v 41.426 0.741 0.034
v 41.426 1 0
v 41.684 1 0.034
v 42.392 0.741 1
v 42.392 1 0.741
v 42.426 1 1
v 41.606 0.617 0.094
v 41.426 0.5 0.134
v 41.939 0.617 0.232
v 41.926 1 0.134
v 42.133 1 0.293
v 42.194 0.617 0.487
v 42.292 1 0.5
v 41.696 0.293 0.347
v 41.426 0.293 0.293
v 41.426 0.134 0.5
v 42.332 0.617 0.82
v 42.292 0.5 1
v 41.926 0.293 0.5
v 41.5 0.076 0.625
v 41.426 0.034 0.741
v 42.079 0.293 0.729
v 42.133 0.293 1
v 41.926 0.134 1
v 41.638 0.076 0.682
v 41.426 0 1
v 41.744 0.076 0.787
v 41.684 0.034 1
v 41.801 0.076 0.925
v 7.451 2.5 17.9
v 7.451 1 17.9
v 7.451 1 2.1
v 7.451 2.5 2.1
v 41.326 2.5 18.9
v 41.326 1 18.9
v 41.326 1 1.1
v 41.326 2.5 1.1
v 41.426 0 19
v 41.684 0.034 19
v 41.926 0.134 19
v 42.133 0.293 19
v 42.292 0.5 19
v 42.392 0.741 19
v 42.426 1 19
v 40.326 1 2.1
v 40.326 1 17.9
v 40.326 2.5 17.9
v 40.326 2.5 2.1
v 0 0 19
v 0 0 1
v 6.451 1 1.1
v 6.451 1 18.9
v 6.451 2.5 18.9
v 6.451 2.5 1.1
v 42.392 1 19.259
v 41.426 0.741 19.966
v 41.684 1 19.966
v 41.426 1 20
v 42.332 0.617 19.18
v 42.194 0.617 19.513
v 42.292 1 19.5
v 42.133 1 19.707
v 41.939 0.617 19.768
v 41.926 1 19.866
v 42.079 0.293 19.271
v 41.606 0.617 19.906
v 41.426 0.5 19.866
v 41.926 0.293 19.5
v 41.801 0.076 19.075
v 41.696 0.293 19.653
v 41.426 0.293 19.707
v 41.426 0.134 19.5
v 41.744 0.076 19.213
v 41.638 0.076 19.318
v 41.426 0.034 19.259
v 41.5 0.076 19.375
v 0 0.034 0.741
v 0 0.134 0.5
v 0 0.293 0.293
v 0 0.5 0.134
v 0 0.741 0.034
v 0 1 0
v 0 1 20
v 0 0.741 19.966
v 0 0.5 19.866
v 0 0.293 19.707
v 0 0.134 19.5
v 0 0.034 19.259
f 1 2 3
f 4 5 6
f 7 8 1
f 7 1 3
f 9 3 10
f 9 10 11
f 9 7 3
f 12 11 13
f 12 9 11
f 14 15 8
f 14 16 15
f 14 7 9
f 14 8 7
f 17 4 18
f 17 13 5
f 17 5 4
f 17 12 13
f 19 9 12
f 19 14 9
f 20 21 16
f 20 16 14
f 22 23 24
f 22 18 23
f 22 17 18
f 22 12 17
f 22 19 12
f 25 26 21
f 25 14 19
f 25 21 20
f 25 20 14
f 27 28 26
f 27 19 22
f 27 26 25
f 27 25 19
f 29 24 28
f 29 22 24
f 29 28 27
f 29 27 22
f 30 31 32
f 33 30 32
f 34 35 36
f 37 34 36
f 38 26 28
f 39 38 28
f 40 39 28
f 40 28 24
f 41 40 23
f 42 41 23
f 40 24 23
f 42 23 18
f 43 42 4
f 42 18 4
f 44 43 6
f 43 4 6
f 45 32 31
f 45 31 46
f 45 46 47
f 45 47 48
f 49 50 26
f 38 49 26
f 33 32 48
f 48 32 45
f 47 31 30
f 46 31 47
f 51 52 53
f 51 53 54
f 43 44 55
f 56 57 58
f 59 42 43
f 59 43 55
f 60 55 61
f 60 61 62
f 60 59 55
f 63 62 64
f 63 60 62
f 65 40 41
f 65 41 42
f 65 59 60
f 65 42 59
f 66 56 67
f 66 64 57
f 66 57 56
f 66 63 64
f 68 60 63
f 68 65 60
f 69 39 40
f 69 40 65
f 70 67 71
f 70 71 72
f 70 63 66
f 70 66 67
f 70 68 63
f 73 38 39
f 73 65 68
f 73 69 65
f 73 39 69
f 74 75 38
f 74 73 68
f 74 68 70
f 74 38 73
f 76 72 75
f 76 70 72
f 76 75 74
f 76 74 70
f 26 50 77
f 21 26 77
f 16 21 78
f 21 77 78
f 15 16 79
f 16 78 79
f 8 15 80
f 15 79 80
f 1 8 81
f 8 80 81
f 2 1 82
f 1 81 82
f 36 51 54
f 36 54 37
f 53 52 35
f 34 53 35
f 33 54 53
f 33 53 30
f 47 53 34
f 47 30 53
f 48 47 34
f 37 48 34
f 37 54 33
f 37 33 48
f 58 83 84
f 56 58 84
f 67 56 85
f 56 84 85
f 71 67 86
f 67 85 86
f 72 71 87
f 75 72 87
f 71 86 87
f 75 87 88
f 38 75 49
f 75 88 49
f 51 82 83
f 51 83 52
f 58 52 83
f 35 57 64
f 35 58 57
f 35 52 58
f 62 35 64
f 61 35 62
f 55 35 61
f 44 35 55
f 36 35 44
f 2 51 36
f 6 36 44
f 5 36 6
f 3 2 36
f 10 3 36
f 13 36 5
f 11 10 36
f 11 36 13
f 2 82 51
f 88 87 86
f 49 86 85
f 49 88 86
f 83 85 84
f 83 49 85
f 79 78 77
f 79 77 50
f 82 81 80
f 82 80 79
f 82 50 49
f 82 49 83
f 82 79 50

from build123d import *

# Parameters (mm, degrees)
SKETCH1_W           = 42.42562
SKETCH1_H           = 1
BOSS_EXTRUDE1_DEPTH = 19.99996
FILLET1_R           = 1
SKETCH2_W           = 34.8742
SKETCH2_H           = 17.79996
SKETCH2_W_2         = 32.8742
SKETCH2_H_2         = 15.79996
BOSS_EXTRUDE2_DEPTH = 1.5


with BuildPart() as part:
    # Sketch1 → Boss-Extrude1 (new body)
    with BuildSketch(Plane.XY):
        with Locations((21.21281, 0.5)):
            Rectangle(SKETCH1_W, SKETCH1_H)
    extrude(amount=BOSS_EXTRUDE1_DEPTH)

    # Fillet1
    # the kernel refuses this fillet: 1 mm, written as the material it takes off along each edge
    with BuildSketch(Plane(origin=(41.42562, 1, 18.99996), x_dir=(1, 0, 0), z_dir=(0, -1, 0))) as fillet1_piece_1_section:
        Polygon((0, 0), (FILLET1_R * 1.02, 0), (FILLET1_R * 1.02, FILLET1_R * 1.02), (0, FILLET1_R * 1.02), align=None)
    fillet1_piece_1 = extrude(amount=FILLET1_R * 1.02, mode=Mode.PRIVATE)
    fillet1_piece_1 = fillet1_piece_1 - Plane(origin=(41.42562, 1, 18.99996), x_dir=(-0.7071067811865475, 0, -0.7071067811865475), z_dir=(0, -1, 0)) * Sphere(FILLET1_R, mode=Mode.PRIVATE)
    add(fillet1_piece_1, mode=Mode.SUBTRACT)
    with BuildSketch(Plane(origin=(41.42562, 1, 1), x_dir=(1, 0, 0), z_dir=(0, -1, 0))) as fillet1_piece_2_section:
        Polygon((0, 0), (FILLET1_R * 1.02, 0), (FILLET1_R * 1.02, -FILLET1_R * 1.02), (0, -FILLET1_R * 1.02), align=None)
    fillet1_piece_2 = extrude(amount=FILLET1_R * 1.02, mode=Mode.PRIVATE)
    fillet1_piece_2 = fillet1_piece_2 - Plane(origin=(41.42562, 1, 1), x_dir=(-0.7071067811865475, 0, 0.7071067811865475), z_dir=(0, -1, 0)) * Sphere(FILLET1_R, mode=Mode.PRIVATE)
    add(fillet1_piece_2, mode=Mode.SUBTRACT)
    with BuildSketch(Plane(origin=(-2.5, 0, 0), x_dir=(0, 0, 1), z_dir=(1, 0, 0))) as fillet1_piece_3:
        with BuildLine():
            CenterArc((FILLET1_R, -FILLET1_R), FILLET1_R, 90, 90)
            Line((0, -FILLET1_R), (0, 0))
            Line((0, 0), (FILLET1_R, 0))
        make_face()
    extrude(amount=43.92562, mode=Mode.SUBTRACT)
    with BuildSketch(Plane(origin=(-2.5, 0, 19.99996), x_dir=(0, 0, -1), z_dir=(1, 0, 0))) as fillet1_piece_4:
        with BuildLine():
            CenterArc((FILLET1_R, FILLET1_R), FILLET1_R, 180, 90)
            Line((0, FILLET1_R), (0, 0))
            Line((0, 0), (FILLET1_R, 0))
        make_face()
    extrude(amount=43.92562, mode=Mode.SUBTRACT)
    with BuildSketch(Plane(origin=(42.42562, 0, 1), x_dir=(-1, 0, 0), z_dir=(0, 0, 1))) as fillet1_piece_5:
        with BuildLine():
            CenterArc((FILLET1_R, -FILLET1_R), FILLET1_R, 90, 90)
            Line((0, -FILLET1_R), (0, 0))
            Line((0, 0), (FILLET1_R, 0))
        make_face()
    extrude(amount=17.99996, mode=Mode.SUBTRACT)

    # Sketch2 → Boss-Extrude2 (add)
    with BuildSketch(Plane(origin=(0, 1, 0), x_dir=(1, 0, 0), z_dir=(0, 1, 0))):
        with Locations((23.88852, -9.99998)):
            Rectangle(SKETCH2_W, SKETCH2_H)
        with Locations((23.88852, -9.99998)):
            Rectangle(SKETCH2_W_2, SKETCH2_H_2, mode=Mode.SUBTRACT)
    extrude(amount=BOSS_EXTRUDE2_DEPTH)


solid = part.part
